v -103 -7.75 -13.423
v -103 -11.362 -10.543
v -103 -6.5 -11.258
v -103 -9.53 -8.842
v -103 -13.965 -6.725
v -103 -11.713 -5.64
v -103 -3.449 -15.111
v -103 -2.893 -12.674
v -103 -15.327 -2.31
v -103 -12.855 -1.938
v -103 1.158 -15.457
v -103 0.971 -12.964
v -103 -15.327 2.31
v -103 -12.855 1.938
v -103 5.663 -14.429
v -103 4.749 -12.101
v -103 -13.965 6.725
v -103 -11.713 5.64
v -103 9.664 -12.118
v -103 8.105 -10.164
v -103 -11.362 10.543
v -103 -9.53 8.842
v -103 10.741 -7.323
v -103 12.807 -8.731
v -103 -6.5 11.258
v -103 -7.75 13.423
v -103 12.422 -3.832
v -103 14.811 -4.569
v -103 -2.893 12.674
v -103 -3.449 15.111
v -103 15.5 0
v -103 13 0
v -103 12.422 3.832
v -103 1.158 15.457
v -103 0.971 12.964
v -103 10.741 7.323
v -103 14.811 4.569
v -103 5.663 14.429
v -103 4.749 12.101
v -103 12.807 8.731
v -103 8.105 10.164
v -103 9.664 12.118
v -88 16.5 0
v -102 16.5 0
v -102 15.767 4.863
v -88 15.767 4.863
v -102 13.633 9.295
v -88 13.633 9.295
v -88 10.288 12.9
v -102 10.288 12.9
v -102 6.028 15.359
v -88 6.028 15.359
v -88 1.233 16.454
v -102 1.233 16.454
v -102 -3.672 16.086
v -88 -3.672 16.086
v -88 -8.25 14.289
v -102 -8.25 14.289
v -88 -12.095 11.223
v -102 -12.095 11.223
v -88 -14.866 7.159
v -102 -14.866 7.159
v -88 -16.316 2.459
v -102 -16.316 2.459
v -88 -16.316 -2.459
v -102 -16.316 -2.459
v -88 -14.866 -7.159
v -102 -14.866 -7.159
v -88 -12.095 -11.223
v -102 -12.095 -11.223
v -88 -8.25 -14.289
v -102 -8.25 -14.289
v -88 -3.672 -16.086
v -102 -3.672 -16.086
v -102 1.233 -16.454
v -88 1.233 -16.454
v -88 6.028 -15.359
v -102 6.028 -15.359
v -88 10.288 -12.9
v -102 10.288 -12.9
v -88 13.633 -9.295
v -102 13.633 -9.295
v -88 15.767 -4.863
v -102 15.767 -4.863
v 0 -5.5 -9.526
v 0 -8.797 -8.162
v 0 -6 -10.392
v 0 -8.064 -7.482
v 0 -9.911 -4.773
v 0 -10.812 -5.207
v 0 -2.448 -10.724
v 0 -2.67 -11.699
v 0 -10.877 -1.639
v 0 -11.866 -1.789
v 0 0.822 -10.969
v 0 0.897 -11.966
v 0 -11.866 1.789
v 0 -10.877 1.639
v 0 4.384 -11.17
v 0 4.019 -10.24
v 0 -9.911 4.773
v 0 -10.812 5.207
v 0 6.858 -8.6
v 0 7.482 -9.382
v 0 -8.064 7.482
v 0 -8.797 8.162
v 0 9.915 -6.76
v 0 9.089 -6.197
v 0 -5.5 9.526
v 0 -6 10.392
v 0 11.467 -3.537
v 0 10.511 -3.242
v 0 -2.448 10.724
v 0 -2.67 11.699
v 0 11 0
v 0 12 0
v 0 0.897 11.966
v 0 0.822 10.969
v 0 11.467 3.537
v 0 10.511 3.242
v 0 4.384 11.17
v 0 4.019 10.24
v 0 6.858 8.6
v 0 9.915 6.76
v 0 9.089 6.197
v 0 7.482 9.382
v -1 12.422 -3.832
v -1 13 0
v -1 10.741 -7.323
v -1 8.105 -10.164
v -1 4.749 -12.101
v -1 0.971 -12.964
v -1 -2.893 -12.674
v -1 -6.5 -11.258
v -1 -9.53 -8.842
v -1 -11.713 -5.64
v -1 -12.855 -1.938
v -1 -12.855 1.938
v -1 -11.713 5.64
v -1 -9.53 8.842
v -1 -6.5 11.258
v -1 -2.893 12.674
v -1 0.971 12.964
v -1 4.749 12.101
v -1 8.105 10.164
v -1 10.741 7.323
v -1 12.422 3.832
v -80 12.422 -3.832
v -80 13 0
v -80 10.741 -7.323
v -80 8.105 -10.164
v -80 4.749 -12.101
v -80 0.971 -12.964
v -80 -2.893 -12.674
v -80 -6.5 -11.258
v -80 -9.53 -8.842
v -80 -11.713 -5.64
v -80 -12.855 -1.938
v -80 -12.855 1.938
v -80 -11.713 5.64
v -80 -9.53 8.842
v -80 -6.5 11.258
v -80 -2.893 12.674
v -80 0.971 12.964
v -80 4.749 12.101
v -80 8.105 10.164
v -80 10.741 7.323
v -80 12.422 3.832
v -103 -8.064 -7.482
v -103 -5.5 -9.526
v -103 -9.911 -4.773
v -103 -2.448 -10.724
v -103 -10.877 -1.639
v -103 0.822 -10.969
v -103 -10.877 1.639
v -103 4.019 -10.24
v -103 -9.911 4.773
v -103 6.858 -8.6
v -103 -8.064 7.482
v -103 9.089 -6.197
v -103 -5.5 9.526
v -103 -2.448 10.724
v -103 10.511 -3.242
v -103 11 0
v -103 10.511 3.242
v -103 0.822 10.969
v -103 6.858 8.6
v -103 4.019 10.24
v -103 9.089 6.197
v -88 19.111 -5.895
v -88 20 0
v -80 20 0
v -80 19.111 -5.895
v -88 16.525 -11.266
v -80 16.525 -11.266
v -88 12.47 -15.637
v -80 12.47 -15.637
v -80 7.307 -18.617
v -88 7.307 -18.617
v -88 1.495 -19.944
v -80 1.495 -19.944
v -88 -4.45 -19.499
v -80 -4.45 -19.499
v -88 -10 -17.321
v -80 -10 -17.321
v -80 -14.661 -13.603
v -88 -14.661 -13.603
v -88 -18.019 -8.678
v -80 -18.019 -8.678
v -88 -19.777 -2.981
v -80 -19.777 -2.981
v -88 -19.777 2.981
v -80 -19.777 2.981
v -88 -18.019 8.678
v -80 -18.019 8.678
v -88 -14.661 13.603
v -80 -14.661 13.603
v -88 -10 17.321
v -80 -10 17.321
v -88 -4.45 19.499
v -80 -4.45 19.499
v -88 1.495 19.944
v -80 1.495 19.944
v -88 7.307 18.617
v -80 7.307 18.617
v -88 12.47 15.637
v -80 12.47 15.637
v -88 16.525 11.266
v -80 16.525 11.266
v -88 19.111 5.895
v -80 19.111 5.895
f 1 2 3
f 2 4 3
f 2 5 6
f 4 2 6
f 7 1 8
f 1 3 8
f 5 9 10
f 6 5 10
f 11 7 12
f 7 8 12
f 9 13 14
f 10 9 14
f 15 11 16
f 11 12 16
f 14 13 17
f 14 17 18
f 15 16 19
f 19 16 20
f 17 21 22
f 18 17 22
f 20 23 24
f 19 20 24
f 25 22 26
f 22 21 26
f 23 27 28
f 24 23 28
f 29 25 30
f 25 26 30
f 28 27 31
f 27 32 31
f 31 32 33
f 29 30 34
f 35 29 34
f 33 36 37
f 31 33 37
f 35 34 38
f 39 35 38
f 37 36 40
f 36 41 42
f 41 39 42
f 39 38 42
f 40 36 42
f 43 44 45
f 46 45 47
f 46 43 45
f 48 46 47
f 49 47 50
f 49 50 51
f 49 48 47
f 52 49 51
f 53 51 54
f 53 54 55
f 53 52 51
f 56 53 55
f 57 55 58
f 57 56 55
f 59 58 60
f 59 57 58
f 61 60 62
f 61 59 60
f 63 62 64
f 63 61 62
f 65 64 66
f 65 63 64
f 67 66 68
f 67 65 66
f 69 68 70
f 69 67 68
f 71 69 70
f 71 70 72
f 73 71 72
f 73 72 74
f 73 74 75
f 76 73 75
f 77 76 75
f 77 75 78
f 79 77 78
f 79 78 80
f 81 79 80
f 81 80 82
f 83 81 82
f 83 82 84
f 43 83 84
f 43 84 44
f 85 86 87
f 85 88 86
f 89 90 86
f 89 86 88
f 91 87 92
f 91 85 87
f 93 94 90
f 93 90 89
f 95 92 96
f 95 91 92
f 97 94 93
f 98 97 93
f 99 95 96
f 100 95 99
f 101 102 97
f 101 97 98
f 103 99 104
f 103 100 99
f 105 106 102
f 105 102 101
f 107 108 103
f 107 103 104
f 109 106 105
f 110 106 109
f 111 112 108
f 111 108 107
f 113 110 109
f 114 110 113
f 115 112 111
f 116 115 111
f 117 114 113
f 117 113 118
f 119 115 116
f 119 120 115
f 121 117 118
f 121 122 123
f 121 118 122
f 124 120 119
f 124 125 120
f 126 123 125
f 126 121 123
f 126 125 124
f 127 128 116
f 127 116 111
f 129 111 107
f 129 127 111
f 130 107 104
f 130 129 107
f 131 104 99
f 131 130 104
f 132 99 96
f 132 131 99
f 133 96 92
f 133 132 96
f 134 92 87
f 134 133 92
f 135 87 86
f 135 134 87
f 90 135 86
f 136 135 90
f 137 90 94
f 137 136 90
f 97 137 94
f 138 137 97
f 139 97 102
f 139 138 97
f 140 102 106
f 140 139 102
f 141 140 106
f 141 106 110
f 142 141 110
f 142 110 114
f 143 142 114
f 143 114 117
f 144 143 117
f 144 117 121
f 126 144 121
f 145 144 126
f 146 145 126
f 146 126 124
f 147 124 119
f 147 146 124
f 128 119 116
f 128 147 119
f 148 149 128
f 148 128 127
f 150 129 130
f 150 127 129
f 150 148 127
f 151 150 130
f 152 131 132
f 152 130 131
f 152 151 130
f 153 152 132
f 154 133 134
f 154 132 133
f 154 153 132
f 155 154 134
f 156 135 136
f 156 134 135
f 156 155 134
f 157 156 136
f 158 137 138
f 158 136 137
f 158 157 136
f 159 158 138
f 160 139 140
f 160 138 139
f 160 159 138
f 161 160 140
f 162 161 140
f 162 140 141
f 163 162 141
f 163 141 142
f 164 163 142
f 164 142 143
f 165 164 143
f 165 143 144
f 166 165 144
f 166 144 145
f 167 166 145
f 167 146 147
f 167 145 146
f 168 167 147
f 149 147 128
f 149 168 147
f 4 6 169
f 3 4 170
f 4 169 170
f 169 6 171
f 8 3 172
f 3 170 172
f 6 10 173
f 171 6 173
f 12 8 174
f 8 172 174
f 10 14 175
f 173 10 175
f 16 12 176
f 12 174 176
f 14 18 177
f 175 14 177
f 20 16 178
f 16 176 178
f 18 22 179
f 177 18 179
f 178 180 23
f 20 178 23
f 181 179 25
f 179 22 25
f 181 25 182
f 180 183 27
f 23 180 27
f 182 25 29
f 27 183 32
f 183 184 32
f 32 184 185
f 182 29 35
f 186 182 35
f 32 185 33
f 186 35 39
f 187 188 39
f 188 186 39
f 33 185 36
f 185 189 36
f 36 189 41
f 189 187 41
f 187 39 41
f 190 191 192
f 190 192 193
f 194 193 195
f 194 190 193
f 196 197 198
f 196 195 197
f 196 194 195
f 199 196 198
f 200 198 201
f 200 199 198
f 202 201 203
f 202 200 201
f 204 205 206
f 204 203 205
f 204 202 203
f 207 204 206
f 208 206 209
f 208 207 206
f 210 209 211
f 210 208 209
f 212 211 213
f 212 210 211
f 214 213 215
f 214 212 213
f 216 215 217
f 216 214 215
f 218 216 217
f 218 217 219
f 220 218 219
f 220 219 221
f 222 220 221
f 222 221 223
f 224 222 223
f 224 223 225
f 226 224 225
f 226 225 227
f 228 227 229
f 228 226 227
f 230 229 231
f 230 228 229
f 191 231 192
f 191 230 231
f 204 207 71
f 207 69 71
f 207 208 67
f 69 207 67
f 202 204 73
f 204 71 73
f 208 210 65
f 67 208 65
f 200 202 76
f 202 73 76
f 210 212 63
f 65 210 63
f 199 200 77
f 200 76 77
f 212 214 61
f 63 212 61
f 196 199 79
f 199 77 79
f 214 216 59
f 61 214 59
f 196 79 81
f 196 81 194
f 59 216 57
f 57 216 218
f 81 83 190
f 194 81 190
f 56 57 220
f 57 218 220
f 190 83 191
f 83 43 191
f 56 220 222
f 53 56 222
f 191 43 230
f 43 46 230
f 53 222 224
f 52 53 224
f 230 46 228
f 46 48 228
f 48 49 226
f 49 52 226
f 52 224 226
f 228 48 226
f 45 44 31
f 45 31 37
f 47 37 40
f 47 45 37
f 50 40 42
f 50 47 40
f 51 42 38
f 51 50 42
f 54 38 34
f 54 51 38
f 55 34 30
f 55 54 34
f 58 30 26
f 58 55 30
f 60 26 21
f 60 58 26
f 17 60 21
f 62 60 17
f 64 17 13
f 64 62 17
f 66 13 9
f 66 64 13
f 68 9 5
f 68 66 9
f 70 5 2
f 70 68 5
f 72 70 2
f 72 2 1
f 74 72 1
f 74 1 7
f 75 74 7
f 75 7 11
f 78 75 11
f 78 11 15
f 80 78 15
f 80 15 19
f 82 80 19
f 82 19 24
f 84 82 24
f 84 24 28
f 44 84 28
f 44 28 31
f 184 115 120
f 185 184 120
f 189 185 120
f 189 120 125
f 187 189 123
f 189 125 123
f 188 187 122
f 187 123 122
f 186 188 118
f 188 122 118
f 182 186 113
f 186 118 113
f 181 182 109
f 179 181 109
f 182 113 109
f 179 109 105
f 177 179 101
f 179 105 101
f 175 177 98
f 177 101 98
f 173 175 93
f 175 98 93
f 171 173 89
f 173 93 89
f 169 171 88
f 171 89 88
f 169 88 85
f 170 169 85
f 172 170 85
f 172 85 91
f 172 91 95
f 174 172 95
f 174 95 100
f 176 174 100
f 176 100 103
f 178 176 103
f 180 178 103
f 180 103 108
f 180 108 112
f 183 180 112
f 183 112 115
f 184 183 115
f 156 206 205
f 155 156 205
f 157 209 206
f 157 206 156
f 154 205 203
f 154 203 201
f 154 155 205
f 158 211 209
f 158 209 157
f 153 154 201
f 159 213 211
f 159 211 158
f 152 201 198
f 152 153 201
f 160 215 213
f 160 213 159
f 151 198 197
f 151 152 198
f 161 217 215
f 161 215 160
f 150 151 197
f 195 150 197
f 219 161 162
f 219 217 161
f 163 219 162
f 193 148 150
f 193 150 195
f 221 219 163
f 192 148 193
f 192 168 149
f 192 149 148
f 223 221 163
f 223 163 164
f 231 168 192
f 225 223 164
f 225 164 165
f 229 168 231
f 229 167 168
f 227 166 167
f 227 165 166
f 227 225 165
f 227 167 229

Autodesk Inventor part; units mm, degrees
ref_plane "YZ Plane" through (0, 0, 0) normal (1, 0, 0) x (0, 1, 0)
ref_plane "XZ Plane" through (0, 0, 0) normal (0, 1, 0) x (-1, 0, 0)
ref_plane "XY Plane" through (0, 0, 0) normal (0, 0, 1) x (1, 0, 0)
sketch "Sketch1" plane through (0, 0, 0) normal (0, 0, 1) x (1, 0, 0)
  line L0 (-103, 11) -> (0, 11)
  line L1 (0, 11) -> (0, 12)
  line L2 (-1, 13) -> (-80, 13)
  line L3 (-80, 13) -> (-80, 20)
  line L4 (-80, 20) -> (-88, 20)
  line L5 (-103, 13) -> (-103, 11)
  line L6 (-103, 13) -> (-103, 15.5)
  line L7 (-102, 16.5) -> (-88, 16.5)
  line L8 (-88, 20) -> (-88, 16.5)
  line L9 (0, 12) -> (-1, 13)
  line L10 (-102, 16.5) -> (-103, 15.5)
  line L11 (-118.5, 0) -> (44.527, 0) construction
  point P0 (0, 0)
  point P1 (0, 13)
  point P2 (-84, 20)
  point P3 (-103, 16.5)
  dimension "d0" = 103
  dimension "d1" = 11
  dimension "d2" = 0
  dimension "d4" = 8
  dimension "d5" = 80
  dimension "d7" = 13
  dimension "d11" = 15
  dimension "d12" = 16.5
  dimension "d13" = 20
  dimension "d14" = 1
  dimension "d15" = 1
  dimension "d16" = 1
  dimension "d17" = 1
revolve "Revolution1" add sketch "Sketch1" angle 360 about axis through (-118.5, 0, 0) along (1, 0, 0)
equation "\"d15\" = d14"
equation "\"d17\" = d16"
properties part number "Bucha do Ferramental"
